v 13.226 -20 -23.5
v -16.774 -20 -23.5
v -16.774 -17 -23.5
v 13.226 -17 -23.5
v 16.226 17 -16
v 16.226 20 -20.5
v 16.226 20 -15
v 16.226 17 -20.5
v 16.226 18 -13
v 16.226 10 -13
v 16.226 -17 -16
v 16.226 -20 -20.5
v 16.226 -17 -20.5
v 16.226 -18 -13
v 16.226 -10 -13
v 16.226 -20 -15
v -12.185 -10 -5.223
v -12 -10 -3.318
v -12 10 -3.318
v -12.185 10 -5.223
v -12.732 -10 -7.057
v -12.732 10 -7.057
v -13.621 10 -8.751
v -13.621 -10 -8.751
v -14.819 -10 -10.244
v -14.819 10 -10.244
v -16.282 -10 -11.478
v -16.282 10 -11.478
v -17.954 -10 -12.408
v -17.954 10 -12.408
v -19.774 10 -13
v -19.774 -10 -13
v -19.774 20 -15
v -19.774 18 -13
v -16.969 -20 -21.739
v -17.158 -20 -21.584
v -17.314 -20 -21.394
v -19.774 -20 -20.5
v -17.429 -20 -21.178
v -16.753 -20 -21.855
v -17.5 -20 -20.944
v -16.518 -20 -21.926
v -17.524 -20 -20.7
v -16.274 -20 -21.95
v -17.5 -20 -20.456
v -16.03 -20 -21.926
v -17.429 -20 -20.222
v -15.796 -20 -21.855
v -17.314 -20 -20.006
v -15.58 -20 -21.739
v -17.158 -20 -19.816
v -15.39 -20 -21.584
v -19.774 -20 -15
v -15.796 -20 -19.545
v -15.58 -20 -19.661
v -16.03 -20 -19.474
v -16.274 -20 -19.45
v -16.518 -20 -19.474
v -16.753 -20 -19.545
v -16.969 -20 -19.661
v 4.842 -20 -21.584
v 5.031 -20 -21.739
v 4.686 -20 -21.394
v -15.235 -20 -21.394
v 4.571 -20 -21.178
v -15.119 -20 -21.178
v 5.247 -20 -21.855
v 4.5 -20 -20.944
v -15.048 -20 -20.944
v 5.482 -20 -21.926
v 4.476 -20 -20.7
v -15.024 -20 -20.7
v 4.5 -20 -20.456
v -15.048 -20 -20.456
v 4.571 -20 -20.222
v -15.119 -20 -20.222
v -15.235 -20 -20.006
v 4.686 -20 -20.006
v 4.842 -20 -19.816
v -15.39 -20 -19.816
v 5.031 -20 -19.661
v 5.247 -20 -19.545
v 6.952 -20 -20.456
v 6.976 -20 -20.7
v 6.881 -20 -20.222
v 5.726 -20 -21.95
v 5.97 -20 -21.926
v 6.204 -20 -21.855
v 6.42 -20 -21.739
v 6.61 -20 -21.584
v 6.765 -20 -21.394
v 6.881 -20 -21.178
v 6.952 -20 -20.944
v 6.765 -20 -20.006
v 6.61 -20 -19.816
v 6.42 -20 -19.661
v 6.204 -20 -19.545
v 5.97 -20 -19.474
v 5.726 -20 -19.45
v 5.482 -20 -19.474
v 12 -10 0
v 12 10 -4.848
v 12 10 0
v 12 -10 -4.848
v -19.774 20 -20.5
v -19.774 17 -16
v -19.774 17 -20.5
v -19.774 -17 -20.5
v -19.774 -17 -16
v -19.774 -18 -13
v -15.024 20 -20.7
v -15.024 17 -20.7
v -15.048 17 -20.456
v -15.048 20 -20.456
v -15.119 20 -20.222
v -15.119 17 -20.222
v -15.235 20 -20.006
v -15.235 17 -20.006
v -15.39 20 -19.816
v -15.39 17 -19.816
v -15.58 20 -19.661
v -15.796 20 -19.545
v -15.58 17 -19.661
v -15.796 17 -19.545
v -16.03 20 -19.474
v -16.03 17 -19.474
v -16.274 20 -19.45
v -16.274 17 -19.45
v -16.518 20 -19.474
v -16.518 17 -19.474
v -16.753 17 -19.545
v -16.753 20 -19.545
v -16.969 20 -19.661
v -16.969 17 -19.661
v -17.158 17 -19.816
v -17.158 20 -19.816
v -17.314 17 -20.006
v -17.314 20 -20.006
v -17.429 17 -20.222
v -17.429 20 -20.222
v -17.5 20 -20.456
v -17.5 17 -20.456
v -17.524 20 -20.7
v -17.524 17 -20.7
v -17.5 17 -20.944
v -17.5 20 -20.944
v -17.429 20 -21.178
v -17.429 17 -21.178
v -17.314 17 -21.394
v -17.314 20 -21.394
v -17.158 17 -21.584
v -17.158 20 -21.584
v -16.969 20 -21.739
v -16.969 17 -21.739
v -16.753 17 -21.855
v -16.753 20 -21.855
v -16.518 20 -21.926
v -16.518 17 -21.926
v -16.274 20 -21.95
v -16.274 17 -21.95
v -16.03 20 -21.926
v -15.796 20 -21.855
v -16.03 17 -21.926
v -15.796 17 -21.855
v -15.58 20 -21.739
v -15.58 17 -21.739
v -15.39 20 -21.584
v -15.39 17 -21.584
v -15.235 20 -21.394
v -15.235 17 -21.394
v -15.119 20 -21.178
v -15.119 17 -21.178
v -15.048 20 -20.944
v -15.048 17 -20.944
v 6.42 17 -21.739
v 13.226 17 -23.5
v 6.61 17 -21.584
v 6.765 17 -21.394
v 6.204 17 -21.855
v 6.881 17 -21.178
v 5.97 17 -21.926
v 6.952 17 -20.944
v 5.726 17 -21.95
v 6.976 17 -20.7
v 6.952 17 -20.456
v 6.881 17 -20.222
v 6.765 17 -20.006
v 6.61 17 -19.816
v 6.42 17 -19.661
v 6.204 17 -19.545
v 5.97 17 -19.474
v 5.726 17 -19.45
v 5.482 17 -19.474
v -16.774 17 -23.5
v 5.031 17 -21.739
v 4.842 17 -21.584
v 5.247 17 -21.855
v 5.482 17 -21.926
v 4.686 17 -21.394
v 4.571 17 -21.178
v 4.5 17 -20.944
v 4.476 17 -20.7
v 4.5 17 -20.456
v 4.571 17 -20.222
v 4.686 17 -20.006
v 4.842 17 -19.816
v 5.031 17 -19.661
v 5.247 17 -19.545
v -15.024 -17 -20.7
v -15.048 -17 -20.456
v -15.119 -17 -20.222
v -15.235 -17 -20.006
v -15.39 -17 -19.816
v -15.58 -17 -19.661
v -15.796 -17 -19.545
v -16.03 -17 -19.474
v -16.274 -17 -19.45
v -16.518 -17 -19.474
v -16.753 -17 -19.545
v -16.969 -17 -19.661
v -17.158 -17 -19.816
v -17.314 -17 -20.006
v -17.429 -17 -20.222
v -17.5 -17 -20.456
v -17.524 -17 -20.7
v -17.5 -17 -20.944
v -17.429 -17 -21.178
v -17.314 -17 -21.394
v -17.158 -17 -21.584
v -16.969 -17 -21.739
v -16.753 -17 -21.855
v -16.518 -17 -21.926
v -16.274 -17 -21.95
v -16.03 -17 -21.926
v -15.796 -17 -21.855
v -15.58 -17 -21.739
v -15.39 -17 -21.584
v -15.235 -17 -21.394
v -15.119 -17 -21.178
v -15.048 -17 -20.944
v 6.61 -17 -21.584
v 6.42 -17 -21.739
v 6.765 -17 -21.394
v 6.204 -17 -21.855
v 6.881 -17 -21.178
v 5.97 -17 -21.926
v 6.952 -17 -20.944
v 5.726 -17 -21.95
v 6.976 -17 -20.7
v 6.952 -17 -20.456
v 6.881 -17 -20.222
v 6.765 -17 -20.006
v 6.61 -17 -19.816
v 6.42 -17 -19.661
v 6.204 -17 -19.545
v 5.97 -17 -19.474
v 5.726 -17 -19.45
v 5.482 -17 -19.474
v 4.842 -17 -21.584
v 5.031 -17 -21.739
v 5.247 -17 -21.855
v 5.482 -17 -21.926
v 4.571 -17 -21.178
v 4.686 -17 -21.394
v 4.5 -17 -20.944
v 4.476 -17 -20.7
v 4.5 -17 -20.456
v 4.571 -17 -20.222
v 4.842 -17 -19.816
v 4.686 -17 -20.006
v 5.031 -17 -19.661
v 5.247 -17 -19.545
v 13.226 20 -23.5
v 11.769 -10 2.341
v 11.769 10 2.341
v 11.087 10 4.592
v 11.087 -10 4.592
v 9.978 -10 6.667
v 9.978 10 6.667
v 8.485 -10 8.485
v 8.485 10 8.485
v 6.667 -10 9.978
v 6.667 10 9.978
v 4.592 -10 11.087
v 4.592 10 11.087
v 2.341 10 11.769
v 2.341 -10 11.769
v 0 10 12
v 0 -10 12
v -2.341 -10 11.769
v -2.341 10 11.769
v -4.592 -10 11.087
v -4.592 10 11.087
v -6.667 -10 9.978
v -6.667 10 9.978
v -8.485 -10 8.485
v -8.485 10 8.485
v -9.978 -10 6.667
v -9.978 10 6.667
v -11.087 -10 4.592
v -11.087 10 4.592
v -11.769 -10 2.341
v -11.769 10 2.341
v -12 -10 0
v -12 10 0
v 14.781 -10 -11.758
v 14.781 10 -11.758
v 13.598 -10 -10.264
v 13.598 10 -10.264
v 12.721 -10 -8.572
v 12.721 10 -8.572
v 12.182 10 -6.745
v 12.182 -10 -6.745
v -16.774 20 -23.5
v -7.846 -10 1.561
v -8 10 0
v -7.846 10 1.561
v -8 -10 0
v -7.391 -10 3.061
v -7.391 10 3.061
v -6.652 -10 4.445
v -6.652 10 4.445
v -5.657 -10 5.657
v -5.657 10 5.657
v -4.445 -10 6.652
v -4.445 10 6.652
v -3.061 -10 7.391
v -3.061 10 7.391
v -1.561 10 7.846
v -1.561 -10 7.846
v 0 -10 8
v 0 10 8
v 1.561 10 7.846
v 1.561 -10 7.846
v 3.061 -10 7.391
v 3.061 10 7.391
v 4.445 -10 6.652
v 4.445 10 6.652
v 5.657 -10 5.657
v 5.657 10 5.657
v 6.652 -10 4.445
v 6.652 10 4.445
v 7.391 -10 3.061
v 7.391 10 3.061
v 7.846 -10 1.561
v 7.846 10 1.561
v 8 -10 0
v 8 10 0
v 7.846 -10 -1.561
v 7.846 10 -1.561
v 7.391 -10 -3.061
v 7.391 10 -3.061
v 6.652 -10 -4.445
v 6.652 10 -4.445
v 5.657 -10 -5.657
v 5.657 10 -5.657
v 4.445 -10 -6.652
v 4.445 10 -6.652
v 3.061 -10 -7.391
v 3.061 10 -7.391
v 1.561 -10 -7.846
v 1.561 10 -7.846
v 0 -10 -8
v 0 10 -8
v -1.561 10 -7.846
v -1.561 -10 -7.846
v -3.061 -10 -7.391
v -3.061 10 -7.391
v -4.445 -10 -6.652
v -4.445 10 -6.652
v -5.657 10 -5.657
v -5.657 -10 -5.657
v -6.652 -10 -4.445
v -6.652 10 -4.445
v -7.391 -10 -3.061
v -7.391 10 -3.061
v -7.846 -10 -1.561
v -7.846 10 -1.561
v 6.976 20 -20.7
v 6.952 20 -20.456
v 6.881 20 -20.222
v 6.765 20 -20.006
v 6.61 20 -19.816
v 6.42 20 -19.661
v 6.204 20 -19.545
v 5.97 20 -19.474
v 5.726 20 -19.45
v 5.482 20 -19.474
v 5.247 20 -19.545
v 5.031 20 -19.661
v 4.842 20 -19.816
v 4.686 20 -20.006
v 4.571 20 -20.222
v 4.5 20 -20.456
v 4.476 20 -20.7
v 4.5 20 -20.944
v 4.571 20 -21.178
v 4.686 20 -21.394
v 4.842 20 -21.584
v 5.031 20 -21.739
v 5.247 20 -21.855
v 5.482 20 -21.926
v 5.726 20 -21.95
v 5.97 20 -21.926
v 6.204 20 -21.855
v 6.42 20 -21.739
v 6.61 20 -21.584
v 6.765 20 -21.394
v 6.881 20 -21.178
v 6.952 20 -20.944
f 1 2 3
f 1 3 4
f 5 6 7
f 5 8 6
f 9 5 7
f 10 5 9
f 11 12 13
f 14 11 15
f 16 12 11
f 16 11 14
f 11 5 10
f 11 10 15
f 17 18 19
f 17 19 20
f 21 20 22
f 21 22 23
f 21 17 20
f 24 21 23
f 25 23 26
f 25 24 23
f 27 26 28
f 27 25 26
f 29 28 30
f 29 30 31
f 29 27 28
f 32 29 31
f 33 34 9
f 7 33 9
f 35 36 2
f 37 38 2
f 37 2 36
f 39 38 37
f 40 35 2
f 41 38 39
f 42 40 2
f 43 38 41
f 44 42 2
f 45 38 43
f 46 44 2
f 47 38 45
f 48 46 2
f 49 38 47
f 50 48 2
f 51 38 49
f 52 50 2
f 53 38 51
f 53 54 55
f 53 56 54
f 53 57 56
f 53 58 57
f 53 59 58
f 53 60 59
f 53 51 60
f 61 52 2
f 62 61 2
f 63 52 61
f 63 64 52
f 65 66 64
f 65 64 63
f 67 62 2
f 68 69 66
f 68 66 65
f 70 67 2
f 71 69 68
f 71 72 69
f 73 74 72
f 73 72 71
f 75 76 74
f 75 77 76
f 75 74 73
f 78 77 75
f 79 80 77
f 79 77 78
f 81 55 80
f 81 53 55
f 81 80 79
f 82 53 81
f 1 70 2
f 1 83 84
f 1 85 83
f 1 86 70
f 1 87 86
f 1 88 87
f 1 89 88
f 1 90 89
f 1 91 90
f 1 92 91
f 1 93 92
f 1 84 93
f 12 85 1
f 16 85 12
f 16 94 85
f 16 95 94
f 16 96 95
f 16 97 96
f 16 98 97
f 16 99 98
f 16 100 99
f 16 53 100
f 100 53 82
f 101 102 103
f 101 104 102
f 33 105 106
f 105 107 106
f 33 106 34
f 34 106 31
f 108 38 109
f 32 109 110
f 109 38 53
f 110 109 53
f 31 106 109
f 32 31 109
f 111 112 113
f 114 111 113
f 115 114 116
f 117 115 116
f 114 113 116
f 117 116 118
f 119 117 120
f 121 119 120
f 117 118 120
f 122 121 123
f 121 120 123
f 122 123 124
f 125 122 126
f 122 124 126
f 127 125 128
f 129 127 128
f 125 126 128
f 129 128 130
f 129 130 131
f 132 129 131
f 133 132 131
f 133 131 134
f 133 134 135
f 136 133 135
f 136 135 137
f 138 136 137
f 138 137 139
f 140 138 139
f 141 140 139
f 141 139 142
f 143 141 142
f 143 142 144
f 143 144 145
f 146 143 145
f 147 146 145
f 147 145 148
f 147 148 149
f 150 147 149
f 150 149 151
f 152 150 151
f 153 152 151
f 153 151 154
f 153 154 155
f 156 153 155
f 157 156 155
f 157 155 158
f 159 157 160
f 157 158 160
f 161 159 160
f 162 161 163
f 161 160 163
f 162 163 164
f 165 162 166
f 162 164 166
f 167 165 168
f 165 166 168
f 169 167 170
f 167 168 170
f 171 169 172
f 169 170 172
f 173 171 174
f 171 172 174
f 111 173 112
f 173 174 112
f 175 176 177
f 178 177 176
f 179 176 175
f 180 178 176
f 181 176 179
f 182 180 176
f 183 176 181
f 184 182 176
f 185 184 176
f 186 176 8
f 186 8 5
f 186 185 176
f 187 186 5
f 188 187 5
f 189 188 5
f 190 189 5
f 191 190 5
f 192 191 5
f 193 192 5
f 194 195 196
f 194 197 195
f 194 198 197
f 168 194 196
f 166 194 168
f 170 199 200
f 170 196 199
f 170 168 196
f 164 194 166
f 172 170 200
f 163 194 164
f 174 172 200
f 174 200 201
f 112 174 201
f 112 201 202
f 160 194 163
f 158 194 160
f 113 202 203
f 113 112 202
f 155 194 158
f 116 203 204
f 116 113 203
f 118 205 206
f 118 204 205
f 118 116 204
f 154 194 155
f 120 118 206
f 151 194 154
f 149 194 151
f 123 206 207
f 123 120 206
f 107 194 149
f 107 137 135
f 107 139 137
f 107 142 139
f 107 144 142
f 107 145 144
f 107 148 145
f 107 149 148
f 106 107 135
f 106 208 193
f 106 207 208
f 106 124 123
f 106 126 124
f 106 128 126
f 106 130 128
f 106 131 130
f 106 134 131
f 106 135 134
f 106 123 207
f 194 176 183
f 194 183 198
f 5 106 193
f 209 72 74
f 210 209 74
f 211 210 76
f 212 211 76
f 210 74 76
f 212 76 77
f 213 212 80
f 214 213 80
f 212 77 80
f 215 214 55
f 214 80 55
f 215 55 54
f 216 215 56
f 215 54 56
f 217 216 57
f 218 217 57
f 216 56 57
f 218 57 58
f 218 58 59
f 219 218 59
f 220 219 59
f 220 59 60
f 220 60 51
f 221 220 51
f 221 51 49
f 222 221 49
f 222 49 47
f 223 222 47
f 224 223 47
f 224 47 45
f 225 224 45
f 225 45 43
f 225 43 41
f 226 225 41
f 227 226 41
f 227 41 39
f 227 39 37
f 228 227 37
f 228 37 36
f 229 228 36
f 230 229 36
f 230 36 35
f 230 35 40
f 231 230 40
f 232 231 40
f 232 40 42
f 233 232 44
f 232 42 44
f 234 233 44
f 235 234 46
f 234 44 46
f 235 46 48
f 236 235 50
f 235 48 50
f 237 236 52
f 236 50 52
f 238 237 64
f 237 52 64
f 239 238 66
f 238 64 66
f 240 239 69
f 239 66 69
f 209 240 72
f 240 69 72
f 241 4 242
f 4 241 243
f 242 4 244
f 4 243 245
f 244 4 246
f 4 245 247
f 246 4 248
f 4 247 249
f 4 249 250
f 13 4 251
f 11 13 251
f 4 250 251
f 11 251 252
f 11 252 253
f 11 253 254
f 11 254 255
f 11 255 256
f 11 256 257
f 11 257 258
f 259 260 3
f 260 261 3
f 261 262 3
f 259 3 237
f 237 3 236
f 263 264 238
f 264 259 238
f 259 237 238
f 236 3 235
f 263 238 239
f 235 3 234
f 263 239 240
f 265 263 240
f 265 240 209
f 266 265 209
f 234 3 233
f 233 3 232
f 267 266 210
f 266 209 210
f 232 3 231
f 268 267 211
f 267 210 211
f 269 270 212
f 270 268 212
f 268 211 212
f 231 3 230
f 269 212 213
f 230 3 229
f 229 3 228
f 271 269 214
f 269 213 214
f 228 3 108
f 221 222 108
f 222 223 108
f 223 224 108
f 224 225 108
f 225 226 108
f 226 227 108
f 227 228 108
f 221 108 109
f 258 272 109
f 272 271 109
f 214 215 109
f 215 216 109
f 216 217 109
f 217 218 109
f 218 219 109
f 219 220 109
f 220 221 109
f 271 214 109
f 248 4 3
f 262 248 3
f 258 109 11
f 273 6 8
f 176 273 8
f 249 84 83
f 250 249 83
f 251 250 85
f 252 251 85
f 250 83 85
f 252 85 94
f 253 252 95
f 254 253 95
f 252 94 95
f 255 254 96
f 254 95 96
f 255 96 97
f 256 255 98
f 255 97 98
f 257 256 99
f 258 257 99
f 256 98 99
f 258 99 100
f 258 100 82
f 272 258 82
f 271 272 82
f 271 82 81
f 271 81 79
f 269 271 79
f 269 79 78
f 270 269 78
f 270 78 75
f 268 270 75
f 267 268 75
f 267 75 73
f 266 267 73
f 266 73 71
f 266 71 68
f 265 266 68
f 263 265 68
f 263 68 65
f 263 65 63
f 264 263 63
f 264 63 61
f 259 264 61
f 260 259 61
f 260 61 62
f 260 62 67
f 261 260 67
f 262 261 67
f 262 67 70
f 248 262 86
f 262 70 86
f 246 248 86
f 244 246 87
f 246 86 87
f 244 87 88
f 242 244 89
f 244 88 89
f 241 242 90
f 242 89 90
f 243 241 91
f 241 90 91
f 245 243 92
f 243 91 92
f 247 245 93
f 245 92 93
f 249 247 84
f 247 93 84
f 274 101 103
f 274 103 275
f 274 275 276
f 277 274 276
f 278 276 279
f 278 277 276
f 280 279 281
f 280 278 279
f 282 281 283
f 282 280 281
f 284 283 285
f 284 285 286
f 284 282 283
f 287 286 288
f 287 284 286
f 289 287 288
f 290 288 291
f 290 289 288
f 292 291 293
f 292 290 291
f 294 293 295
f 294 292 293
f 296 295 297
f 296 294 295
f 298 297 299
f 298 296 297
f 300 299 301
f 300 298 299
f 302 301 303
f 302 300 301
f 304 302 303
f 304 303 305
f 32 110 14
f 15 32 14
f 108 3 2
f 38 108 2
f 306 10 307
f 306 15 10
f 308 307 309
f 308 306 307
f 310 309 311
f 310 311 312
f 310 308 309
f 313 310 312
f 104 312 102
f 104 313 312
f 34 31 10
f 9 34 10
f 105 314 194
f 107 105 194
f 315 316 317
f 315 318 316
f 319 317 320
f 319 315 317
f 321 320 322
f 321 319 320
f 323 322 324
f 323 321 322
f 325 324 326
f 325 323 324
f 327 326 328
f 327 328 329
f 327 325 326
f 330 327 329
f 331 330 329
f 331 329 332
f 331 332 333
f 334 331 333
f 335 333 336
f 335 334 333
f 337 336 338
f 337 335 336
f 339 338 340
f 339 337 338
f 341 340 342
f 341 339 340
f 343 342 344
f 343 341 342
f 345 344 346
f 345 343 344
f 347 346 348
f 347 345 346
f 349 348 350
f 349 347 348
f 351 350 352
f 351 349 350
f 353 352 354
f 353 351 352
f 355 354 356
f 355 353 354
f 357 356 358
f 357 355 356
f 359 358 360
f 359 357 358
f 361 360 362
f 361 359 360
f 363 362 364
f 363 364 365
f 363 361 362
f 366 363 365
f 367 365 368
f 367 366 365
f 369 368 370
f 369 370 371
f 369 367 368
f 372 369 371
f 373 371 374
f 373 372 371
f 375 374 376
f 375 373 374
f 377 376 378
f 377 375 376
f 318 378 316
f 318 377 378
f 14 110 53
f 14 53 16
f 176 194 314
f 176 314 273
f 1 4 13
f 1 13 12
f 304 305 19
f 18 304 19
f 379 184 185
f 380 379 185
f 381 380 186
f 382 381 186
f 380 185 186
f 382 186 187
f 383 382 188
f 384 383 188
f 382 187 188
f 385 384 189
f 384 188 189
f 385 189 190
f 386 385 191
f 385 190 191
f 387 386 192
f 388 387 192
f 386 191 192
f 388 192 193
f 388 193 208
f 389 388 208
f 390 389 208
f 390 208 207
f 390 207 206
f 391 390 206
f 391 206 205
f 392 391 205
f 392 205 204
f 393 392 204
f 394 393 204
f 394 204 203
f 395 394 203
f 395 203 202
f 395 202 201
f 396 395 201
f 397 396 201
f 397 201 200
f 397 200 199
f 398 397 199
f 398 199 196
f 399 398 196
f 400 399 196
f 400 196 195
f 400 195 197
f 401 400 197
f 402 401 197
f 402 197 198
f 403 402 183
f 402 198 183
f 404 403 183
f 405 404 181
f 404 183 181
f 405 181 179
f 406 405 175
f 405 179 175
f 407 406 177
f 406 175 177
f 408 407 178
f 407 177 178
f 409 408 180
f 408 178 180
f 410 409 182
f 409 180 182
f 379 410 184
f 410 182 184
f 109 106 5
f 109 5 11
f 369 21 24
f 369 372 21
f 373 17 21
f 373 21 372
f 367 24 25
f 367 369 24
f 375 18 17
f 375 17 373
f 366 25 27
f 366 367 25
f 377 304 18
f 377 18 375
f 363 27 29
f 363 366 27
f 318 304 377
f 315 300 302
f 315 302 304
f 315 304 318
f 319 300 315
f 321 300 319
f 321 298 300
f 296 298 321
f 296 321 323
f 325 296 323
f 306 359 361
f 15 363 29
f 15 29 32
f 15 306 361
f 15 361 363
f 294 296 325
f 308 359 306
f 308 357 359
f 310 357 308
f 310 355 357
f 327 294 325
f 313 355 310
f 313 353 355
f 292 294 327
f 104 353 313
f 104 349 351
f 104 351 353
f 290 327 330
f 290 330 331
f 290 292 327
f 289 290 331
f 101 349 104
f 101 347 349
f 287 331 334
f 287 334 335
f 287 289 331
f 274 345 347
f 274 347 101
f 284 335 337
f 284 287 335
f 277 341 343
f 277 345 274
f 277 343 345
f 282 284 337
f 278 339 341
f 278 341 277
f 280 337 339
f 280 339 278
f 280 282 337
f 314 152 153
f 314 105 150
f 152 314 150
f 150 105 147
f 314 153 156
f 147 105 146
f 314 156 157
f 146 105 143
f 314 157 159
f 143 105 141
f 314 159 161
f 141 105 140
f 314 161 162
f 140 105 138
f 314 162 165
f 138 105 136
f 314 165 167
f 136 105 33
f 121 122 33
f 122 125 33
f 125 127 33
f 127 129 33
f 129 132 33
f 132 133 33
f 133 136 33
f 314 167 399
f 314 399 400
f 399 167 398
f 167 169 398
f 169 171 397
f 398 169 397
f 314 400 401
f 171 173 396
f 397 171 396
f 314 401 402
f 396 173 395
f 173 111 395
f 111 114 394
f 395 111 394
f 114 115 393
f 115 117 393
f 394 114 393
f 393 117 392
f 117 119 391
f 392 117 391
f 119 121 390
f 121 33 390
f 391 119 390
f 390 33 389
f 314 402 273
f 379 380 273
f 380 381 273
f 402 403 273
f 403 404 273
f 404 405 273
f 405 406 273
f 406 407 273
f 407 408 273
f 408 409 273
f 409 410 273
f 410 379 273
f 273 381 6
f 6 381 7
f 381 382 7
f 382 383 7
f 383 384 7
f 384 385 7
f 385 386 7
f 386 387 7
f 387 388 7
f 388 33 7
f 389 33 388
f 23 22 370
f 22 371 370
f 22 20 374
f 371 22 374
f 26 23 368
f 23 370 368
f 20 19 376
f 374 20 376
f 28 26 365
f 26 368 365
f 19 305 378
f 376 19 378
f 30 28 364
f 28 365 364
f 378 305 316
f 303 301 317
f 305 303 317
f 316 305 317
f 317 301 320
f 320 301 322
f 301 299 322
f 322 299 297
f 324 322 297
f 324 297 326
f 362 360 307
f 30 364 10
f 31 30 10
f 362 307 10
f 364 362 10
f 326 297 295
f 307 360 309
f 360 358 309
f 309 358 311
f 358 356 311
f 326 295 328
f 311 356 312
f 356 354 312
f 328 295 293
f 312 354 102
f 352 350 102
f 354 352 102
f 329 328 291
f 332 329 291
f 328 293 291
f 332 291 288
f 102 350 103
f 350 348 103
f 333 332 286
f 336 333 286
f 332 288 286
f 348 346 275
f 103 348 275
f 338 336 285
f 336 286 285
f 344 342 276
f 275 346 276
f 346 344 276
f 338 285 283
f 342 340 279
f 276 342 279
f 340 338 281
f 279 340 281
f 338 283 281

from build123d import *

# Parameters (mm, degrees)
F1_DEPTH = 10
F0_W     = 36
F0_H     = 10.5
F2_DEPTH = 20
F3_W     = 34
F3_H     = 7.5
F4_DEPTH = 36.001
F5_R     = 1.25
F6_DEPTH = 43.8
F7_SIZE  = 3
F8_SIZE  = 2


with BuildPart() as f1:
    # F0 (on Front) → F1 (new body, symmetric)
    with BuildSketch(Plane.XZ):
        with BuildLine():
            ThreePointArc((-8, 0), (0, 8), (8, 0))
            Line((8, 0), (12, 0))
            ThreePointArc((12, 0), (0, 12), (-12, 0))
            Line((-12, 0), (-8, 0))
        make_face()
        with BuildLine():
            Line((12, 0), (8, 0))
            ThreePointArc((8, 0), (0, -8), (-8, 0))
            Line((-8, 0), (-12, 0))
            Line((-12, 0), (-12, -3.318))
            ThreePointArc((-12, -3.318), (-14.1841212285, -9.5264890007), (-19.774330755, -13))
            Line((-19.774330755, -13), (16.225669245, -13))
            ThreePointArc((16.225669245, -13), (13.1191975203, -9.4390615485), (12, -4.848))
            Line((12, -4.848), (12, 0))
        make_face()
    extrude(amount=F1_DEPTH, both=True)

    # F0 (on Front) → F2 (join, symmetric)
    with BuildSketch(Plane.XZ):
        with Locations((-1.774330755, -18.25)):
            Rectangle(F0_W, F0_H)
    extrude(amount=F2_DEPTH, both=True)

    # F3 (on face) → F4 (cut, through all)
    with BuildSketch(Plane(origin=(-19.774330755, 0, 0), x_dir=(0, -1, 0), z_dir=(-1, 0, 0))):
        with Locations((0, -19.75)):
            Rectangle(F3_W, F3_H)
    extrude(amount=-F4_DEPTH, mode=Mode.SUBTRACT)

    # F5 (on face) → F6 (cut)
    with BuildSketch(Plane.XZ.offset(20)):
        with Locations((-16.274330755, -20.7)):
            Circle(F5_R)
        with Locations((5.725669245, -20.7)):
            Circle(F5_R)
    extrude(amount=-F6_DEPTH, mode=Mode.SUBTRACT)

    # F7
    f7_edges = [f1.edges().sort_by_distance(p)[0] for p in [
        (-19.774331, -18.5, -23.5),
        (-19.774331, 18.5, -23.5),
        (16.225669, 18.5, -23.5),
        (16.225669, -18.5, -23.5),
    ]]
    chamfer(f7_edges, length=F7_SIZE)

    # F8
    f8_edges = [f1.edges().sort_by_distance(p)[0] for p in [
        (-1.774331, -20, -13),
        (-1.774331, 20, -13),
    ]]
    chamfer(f8_edges, length=F8_SIZE)


solid = f1.part
